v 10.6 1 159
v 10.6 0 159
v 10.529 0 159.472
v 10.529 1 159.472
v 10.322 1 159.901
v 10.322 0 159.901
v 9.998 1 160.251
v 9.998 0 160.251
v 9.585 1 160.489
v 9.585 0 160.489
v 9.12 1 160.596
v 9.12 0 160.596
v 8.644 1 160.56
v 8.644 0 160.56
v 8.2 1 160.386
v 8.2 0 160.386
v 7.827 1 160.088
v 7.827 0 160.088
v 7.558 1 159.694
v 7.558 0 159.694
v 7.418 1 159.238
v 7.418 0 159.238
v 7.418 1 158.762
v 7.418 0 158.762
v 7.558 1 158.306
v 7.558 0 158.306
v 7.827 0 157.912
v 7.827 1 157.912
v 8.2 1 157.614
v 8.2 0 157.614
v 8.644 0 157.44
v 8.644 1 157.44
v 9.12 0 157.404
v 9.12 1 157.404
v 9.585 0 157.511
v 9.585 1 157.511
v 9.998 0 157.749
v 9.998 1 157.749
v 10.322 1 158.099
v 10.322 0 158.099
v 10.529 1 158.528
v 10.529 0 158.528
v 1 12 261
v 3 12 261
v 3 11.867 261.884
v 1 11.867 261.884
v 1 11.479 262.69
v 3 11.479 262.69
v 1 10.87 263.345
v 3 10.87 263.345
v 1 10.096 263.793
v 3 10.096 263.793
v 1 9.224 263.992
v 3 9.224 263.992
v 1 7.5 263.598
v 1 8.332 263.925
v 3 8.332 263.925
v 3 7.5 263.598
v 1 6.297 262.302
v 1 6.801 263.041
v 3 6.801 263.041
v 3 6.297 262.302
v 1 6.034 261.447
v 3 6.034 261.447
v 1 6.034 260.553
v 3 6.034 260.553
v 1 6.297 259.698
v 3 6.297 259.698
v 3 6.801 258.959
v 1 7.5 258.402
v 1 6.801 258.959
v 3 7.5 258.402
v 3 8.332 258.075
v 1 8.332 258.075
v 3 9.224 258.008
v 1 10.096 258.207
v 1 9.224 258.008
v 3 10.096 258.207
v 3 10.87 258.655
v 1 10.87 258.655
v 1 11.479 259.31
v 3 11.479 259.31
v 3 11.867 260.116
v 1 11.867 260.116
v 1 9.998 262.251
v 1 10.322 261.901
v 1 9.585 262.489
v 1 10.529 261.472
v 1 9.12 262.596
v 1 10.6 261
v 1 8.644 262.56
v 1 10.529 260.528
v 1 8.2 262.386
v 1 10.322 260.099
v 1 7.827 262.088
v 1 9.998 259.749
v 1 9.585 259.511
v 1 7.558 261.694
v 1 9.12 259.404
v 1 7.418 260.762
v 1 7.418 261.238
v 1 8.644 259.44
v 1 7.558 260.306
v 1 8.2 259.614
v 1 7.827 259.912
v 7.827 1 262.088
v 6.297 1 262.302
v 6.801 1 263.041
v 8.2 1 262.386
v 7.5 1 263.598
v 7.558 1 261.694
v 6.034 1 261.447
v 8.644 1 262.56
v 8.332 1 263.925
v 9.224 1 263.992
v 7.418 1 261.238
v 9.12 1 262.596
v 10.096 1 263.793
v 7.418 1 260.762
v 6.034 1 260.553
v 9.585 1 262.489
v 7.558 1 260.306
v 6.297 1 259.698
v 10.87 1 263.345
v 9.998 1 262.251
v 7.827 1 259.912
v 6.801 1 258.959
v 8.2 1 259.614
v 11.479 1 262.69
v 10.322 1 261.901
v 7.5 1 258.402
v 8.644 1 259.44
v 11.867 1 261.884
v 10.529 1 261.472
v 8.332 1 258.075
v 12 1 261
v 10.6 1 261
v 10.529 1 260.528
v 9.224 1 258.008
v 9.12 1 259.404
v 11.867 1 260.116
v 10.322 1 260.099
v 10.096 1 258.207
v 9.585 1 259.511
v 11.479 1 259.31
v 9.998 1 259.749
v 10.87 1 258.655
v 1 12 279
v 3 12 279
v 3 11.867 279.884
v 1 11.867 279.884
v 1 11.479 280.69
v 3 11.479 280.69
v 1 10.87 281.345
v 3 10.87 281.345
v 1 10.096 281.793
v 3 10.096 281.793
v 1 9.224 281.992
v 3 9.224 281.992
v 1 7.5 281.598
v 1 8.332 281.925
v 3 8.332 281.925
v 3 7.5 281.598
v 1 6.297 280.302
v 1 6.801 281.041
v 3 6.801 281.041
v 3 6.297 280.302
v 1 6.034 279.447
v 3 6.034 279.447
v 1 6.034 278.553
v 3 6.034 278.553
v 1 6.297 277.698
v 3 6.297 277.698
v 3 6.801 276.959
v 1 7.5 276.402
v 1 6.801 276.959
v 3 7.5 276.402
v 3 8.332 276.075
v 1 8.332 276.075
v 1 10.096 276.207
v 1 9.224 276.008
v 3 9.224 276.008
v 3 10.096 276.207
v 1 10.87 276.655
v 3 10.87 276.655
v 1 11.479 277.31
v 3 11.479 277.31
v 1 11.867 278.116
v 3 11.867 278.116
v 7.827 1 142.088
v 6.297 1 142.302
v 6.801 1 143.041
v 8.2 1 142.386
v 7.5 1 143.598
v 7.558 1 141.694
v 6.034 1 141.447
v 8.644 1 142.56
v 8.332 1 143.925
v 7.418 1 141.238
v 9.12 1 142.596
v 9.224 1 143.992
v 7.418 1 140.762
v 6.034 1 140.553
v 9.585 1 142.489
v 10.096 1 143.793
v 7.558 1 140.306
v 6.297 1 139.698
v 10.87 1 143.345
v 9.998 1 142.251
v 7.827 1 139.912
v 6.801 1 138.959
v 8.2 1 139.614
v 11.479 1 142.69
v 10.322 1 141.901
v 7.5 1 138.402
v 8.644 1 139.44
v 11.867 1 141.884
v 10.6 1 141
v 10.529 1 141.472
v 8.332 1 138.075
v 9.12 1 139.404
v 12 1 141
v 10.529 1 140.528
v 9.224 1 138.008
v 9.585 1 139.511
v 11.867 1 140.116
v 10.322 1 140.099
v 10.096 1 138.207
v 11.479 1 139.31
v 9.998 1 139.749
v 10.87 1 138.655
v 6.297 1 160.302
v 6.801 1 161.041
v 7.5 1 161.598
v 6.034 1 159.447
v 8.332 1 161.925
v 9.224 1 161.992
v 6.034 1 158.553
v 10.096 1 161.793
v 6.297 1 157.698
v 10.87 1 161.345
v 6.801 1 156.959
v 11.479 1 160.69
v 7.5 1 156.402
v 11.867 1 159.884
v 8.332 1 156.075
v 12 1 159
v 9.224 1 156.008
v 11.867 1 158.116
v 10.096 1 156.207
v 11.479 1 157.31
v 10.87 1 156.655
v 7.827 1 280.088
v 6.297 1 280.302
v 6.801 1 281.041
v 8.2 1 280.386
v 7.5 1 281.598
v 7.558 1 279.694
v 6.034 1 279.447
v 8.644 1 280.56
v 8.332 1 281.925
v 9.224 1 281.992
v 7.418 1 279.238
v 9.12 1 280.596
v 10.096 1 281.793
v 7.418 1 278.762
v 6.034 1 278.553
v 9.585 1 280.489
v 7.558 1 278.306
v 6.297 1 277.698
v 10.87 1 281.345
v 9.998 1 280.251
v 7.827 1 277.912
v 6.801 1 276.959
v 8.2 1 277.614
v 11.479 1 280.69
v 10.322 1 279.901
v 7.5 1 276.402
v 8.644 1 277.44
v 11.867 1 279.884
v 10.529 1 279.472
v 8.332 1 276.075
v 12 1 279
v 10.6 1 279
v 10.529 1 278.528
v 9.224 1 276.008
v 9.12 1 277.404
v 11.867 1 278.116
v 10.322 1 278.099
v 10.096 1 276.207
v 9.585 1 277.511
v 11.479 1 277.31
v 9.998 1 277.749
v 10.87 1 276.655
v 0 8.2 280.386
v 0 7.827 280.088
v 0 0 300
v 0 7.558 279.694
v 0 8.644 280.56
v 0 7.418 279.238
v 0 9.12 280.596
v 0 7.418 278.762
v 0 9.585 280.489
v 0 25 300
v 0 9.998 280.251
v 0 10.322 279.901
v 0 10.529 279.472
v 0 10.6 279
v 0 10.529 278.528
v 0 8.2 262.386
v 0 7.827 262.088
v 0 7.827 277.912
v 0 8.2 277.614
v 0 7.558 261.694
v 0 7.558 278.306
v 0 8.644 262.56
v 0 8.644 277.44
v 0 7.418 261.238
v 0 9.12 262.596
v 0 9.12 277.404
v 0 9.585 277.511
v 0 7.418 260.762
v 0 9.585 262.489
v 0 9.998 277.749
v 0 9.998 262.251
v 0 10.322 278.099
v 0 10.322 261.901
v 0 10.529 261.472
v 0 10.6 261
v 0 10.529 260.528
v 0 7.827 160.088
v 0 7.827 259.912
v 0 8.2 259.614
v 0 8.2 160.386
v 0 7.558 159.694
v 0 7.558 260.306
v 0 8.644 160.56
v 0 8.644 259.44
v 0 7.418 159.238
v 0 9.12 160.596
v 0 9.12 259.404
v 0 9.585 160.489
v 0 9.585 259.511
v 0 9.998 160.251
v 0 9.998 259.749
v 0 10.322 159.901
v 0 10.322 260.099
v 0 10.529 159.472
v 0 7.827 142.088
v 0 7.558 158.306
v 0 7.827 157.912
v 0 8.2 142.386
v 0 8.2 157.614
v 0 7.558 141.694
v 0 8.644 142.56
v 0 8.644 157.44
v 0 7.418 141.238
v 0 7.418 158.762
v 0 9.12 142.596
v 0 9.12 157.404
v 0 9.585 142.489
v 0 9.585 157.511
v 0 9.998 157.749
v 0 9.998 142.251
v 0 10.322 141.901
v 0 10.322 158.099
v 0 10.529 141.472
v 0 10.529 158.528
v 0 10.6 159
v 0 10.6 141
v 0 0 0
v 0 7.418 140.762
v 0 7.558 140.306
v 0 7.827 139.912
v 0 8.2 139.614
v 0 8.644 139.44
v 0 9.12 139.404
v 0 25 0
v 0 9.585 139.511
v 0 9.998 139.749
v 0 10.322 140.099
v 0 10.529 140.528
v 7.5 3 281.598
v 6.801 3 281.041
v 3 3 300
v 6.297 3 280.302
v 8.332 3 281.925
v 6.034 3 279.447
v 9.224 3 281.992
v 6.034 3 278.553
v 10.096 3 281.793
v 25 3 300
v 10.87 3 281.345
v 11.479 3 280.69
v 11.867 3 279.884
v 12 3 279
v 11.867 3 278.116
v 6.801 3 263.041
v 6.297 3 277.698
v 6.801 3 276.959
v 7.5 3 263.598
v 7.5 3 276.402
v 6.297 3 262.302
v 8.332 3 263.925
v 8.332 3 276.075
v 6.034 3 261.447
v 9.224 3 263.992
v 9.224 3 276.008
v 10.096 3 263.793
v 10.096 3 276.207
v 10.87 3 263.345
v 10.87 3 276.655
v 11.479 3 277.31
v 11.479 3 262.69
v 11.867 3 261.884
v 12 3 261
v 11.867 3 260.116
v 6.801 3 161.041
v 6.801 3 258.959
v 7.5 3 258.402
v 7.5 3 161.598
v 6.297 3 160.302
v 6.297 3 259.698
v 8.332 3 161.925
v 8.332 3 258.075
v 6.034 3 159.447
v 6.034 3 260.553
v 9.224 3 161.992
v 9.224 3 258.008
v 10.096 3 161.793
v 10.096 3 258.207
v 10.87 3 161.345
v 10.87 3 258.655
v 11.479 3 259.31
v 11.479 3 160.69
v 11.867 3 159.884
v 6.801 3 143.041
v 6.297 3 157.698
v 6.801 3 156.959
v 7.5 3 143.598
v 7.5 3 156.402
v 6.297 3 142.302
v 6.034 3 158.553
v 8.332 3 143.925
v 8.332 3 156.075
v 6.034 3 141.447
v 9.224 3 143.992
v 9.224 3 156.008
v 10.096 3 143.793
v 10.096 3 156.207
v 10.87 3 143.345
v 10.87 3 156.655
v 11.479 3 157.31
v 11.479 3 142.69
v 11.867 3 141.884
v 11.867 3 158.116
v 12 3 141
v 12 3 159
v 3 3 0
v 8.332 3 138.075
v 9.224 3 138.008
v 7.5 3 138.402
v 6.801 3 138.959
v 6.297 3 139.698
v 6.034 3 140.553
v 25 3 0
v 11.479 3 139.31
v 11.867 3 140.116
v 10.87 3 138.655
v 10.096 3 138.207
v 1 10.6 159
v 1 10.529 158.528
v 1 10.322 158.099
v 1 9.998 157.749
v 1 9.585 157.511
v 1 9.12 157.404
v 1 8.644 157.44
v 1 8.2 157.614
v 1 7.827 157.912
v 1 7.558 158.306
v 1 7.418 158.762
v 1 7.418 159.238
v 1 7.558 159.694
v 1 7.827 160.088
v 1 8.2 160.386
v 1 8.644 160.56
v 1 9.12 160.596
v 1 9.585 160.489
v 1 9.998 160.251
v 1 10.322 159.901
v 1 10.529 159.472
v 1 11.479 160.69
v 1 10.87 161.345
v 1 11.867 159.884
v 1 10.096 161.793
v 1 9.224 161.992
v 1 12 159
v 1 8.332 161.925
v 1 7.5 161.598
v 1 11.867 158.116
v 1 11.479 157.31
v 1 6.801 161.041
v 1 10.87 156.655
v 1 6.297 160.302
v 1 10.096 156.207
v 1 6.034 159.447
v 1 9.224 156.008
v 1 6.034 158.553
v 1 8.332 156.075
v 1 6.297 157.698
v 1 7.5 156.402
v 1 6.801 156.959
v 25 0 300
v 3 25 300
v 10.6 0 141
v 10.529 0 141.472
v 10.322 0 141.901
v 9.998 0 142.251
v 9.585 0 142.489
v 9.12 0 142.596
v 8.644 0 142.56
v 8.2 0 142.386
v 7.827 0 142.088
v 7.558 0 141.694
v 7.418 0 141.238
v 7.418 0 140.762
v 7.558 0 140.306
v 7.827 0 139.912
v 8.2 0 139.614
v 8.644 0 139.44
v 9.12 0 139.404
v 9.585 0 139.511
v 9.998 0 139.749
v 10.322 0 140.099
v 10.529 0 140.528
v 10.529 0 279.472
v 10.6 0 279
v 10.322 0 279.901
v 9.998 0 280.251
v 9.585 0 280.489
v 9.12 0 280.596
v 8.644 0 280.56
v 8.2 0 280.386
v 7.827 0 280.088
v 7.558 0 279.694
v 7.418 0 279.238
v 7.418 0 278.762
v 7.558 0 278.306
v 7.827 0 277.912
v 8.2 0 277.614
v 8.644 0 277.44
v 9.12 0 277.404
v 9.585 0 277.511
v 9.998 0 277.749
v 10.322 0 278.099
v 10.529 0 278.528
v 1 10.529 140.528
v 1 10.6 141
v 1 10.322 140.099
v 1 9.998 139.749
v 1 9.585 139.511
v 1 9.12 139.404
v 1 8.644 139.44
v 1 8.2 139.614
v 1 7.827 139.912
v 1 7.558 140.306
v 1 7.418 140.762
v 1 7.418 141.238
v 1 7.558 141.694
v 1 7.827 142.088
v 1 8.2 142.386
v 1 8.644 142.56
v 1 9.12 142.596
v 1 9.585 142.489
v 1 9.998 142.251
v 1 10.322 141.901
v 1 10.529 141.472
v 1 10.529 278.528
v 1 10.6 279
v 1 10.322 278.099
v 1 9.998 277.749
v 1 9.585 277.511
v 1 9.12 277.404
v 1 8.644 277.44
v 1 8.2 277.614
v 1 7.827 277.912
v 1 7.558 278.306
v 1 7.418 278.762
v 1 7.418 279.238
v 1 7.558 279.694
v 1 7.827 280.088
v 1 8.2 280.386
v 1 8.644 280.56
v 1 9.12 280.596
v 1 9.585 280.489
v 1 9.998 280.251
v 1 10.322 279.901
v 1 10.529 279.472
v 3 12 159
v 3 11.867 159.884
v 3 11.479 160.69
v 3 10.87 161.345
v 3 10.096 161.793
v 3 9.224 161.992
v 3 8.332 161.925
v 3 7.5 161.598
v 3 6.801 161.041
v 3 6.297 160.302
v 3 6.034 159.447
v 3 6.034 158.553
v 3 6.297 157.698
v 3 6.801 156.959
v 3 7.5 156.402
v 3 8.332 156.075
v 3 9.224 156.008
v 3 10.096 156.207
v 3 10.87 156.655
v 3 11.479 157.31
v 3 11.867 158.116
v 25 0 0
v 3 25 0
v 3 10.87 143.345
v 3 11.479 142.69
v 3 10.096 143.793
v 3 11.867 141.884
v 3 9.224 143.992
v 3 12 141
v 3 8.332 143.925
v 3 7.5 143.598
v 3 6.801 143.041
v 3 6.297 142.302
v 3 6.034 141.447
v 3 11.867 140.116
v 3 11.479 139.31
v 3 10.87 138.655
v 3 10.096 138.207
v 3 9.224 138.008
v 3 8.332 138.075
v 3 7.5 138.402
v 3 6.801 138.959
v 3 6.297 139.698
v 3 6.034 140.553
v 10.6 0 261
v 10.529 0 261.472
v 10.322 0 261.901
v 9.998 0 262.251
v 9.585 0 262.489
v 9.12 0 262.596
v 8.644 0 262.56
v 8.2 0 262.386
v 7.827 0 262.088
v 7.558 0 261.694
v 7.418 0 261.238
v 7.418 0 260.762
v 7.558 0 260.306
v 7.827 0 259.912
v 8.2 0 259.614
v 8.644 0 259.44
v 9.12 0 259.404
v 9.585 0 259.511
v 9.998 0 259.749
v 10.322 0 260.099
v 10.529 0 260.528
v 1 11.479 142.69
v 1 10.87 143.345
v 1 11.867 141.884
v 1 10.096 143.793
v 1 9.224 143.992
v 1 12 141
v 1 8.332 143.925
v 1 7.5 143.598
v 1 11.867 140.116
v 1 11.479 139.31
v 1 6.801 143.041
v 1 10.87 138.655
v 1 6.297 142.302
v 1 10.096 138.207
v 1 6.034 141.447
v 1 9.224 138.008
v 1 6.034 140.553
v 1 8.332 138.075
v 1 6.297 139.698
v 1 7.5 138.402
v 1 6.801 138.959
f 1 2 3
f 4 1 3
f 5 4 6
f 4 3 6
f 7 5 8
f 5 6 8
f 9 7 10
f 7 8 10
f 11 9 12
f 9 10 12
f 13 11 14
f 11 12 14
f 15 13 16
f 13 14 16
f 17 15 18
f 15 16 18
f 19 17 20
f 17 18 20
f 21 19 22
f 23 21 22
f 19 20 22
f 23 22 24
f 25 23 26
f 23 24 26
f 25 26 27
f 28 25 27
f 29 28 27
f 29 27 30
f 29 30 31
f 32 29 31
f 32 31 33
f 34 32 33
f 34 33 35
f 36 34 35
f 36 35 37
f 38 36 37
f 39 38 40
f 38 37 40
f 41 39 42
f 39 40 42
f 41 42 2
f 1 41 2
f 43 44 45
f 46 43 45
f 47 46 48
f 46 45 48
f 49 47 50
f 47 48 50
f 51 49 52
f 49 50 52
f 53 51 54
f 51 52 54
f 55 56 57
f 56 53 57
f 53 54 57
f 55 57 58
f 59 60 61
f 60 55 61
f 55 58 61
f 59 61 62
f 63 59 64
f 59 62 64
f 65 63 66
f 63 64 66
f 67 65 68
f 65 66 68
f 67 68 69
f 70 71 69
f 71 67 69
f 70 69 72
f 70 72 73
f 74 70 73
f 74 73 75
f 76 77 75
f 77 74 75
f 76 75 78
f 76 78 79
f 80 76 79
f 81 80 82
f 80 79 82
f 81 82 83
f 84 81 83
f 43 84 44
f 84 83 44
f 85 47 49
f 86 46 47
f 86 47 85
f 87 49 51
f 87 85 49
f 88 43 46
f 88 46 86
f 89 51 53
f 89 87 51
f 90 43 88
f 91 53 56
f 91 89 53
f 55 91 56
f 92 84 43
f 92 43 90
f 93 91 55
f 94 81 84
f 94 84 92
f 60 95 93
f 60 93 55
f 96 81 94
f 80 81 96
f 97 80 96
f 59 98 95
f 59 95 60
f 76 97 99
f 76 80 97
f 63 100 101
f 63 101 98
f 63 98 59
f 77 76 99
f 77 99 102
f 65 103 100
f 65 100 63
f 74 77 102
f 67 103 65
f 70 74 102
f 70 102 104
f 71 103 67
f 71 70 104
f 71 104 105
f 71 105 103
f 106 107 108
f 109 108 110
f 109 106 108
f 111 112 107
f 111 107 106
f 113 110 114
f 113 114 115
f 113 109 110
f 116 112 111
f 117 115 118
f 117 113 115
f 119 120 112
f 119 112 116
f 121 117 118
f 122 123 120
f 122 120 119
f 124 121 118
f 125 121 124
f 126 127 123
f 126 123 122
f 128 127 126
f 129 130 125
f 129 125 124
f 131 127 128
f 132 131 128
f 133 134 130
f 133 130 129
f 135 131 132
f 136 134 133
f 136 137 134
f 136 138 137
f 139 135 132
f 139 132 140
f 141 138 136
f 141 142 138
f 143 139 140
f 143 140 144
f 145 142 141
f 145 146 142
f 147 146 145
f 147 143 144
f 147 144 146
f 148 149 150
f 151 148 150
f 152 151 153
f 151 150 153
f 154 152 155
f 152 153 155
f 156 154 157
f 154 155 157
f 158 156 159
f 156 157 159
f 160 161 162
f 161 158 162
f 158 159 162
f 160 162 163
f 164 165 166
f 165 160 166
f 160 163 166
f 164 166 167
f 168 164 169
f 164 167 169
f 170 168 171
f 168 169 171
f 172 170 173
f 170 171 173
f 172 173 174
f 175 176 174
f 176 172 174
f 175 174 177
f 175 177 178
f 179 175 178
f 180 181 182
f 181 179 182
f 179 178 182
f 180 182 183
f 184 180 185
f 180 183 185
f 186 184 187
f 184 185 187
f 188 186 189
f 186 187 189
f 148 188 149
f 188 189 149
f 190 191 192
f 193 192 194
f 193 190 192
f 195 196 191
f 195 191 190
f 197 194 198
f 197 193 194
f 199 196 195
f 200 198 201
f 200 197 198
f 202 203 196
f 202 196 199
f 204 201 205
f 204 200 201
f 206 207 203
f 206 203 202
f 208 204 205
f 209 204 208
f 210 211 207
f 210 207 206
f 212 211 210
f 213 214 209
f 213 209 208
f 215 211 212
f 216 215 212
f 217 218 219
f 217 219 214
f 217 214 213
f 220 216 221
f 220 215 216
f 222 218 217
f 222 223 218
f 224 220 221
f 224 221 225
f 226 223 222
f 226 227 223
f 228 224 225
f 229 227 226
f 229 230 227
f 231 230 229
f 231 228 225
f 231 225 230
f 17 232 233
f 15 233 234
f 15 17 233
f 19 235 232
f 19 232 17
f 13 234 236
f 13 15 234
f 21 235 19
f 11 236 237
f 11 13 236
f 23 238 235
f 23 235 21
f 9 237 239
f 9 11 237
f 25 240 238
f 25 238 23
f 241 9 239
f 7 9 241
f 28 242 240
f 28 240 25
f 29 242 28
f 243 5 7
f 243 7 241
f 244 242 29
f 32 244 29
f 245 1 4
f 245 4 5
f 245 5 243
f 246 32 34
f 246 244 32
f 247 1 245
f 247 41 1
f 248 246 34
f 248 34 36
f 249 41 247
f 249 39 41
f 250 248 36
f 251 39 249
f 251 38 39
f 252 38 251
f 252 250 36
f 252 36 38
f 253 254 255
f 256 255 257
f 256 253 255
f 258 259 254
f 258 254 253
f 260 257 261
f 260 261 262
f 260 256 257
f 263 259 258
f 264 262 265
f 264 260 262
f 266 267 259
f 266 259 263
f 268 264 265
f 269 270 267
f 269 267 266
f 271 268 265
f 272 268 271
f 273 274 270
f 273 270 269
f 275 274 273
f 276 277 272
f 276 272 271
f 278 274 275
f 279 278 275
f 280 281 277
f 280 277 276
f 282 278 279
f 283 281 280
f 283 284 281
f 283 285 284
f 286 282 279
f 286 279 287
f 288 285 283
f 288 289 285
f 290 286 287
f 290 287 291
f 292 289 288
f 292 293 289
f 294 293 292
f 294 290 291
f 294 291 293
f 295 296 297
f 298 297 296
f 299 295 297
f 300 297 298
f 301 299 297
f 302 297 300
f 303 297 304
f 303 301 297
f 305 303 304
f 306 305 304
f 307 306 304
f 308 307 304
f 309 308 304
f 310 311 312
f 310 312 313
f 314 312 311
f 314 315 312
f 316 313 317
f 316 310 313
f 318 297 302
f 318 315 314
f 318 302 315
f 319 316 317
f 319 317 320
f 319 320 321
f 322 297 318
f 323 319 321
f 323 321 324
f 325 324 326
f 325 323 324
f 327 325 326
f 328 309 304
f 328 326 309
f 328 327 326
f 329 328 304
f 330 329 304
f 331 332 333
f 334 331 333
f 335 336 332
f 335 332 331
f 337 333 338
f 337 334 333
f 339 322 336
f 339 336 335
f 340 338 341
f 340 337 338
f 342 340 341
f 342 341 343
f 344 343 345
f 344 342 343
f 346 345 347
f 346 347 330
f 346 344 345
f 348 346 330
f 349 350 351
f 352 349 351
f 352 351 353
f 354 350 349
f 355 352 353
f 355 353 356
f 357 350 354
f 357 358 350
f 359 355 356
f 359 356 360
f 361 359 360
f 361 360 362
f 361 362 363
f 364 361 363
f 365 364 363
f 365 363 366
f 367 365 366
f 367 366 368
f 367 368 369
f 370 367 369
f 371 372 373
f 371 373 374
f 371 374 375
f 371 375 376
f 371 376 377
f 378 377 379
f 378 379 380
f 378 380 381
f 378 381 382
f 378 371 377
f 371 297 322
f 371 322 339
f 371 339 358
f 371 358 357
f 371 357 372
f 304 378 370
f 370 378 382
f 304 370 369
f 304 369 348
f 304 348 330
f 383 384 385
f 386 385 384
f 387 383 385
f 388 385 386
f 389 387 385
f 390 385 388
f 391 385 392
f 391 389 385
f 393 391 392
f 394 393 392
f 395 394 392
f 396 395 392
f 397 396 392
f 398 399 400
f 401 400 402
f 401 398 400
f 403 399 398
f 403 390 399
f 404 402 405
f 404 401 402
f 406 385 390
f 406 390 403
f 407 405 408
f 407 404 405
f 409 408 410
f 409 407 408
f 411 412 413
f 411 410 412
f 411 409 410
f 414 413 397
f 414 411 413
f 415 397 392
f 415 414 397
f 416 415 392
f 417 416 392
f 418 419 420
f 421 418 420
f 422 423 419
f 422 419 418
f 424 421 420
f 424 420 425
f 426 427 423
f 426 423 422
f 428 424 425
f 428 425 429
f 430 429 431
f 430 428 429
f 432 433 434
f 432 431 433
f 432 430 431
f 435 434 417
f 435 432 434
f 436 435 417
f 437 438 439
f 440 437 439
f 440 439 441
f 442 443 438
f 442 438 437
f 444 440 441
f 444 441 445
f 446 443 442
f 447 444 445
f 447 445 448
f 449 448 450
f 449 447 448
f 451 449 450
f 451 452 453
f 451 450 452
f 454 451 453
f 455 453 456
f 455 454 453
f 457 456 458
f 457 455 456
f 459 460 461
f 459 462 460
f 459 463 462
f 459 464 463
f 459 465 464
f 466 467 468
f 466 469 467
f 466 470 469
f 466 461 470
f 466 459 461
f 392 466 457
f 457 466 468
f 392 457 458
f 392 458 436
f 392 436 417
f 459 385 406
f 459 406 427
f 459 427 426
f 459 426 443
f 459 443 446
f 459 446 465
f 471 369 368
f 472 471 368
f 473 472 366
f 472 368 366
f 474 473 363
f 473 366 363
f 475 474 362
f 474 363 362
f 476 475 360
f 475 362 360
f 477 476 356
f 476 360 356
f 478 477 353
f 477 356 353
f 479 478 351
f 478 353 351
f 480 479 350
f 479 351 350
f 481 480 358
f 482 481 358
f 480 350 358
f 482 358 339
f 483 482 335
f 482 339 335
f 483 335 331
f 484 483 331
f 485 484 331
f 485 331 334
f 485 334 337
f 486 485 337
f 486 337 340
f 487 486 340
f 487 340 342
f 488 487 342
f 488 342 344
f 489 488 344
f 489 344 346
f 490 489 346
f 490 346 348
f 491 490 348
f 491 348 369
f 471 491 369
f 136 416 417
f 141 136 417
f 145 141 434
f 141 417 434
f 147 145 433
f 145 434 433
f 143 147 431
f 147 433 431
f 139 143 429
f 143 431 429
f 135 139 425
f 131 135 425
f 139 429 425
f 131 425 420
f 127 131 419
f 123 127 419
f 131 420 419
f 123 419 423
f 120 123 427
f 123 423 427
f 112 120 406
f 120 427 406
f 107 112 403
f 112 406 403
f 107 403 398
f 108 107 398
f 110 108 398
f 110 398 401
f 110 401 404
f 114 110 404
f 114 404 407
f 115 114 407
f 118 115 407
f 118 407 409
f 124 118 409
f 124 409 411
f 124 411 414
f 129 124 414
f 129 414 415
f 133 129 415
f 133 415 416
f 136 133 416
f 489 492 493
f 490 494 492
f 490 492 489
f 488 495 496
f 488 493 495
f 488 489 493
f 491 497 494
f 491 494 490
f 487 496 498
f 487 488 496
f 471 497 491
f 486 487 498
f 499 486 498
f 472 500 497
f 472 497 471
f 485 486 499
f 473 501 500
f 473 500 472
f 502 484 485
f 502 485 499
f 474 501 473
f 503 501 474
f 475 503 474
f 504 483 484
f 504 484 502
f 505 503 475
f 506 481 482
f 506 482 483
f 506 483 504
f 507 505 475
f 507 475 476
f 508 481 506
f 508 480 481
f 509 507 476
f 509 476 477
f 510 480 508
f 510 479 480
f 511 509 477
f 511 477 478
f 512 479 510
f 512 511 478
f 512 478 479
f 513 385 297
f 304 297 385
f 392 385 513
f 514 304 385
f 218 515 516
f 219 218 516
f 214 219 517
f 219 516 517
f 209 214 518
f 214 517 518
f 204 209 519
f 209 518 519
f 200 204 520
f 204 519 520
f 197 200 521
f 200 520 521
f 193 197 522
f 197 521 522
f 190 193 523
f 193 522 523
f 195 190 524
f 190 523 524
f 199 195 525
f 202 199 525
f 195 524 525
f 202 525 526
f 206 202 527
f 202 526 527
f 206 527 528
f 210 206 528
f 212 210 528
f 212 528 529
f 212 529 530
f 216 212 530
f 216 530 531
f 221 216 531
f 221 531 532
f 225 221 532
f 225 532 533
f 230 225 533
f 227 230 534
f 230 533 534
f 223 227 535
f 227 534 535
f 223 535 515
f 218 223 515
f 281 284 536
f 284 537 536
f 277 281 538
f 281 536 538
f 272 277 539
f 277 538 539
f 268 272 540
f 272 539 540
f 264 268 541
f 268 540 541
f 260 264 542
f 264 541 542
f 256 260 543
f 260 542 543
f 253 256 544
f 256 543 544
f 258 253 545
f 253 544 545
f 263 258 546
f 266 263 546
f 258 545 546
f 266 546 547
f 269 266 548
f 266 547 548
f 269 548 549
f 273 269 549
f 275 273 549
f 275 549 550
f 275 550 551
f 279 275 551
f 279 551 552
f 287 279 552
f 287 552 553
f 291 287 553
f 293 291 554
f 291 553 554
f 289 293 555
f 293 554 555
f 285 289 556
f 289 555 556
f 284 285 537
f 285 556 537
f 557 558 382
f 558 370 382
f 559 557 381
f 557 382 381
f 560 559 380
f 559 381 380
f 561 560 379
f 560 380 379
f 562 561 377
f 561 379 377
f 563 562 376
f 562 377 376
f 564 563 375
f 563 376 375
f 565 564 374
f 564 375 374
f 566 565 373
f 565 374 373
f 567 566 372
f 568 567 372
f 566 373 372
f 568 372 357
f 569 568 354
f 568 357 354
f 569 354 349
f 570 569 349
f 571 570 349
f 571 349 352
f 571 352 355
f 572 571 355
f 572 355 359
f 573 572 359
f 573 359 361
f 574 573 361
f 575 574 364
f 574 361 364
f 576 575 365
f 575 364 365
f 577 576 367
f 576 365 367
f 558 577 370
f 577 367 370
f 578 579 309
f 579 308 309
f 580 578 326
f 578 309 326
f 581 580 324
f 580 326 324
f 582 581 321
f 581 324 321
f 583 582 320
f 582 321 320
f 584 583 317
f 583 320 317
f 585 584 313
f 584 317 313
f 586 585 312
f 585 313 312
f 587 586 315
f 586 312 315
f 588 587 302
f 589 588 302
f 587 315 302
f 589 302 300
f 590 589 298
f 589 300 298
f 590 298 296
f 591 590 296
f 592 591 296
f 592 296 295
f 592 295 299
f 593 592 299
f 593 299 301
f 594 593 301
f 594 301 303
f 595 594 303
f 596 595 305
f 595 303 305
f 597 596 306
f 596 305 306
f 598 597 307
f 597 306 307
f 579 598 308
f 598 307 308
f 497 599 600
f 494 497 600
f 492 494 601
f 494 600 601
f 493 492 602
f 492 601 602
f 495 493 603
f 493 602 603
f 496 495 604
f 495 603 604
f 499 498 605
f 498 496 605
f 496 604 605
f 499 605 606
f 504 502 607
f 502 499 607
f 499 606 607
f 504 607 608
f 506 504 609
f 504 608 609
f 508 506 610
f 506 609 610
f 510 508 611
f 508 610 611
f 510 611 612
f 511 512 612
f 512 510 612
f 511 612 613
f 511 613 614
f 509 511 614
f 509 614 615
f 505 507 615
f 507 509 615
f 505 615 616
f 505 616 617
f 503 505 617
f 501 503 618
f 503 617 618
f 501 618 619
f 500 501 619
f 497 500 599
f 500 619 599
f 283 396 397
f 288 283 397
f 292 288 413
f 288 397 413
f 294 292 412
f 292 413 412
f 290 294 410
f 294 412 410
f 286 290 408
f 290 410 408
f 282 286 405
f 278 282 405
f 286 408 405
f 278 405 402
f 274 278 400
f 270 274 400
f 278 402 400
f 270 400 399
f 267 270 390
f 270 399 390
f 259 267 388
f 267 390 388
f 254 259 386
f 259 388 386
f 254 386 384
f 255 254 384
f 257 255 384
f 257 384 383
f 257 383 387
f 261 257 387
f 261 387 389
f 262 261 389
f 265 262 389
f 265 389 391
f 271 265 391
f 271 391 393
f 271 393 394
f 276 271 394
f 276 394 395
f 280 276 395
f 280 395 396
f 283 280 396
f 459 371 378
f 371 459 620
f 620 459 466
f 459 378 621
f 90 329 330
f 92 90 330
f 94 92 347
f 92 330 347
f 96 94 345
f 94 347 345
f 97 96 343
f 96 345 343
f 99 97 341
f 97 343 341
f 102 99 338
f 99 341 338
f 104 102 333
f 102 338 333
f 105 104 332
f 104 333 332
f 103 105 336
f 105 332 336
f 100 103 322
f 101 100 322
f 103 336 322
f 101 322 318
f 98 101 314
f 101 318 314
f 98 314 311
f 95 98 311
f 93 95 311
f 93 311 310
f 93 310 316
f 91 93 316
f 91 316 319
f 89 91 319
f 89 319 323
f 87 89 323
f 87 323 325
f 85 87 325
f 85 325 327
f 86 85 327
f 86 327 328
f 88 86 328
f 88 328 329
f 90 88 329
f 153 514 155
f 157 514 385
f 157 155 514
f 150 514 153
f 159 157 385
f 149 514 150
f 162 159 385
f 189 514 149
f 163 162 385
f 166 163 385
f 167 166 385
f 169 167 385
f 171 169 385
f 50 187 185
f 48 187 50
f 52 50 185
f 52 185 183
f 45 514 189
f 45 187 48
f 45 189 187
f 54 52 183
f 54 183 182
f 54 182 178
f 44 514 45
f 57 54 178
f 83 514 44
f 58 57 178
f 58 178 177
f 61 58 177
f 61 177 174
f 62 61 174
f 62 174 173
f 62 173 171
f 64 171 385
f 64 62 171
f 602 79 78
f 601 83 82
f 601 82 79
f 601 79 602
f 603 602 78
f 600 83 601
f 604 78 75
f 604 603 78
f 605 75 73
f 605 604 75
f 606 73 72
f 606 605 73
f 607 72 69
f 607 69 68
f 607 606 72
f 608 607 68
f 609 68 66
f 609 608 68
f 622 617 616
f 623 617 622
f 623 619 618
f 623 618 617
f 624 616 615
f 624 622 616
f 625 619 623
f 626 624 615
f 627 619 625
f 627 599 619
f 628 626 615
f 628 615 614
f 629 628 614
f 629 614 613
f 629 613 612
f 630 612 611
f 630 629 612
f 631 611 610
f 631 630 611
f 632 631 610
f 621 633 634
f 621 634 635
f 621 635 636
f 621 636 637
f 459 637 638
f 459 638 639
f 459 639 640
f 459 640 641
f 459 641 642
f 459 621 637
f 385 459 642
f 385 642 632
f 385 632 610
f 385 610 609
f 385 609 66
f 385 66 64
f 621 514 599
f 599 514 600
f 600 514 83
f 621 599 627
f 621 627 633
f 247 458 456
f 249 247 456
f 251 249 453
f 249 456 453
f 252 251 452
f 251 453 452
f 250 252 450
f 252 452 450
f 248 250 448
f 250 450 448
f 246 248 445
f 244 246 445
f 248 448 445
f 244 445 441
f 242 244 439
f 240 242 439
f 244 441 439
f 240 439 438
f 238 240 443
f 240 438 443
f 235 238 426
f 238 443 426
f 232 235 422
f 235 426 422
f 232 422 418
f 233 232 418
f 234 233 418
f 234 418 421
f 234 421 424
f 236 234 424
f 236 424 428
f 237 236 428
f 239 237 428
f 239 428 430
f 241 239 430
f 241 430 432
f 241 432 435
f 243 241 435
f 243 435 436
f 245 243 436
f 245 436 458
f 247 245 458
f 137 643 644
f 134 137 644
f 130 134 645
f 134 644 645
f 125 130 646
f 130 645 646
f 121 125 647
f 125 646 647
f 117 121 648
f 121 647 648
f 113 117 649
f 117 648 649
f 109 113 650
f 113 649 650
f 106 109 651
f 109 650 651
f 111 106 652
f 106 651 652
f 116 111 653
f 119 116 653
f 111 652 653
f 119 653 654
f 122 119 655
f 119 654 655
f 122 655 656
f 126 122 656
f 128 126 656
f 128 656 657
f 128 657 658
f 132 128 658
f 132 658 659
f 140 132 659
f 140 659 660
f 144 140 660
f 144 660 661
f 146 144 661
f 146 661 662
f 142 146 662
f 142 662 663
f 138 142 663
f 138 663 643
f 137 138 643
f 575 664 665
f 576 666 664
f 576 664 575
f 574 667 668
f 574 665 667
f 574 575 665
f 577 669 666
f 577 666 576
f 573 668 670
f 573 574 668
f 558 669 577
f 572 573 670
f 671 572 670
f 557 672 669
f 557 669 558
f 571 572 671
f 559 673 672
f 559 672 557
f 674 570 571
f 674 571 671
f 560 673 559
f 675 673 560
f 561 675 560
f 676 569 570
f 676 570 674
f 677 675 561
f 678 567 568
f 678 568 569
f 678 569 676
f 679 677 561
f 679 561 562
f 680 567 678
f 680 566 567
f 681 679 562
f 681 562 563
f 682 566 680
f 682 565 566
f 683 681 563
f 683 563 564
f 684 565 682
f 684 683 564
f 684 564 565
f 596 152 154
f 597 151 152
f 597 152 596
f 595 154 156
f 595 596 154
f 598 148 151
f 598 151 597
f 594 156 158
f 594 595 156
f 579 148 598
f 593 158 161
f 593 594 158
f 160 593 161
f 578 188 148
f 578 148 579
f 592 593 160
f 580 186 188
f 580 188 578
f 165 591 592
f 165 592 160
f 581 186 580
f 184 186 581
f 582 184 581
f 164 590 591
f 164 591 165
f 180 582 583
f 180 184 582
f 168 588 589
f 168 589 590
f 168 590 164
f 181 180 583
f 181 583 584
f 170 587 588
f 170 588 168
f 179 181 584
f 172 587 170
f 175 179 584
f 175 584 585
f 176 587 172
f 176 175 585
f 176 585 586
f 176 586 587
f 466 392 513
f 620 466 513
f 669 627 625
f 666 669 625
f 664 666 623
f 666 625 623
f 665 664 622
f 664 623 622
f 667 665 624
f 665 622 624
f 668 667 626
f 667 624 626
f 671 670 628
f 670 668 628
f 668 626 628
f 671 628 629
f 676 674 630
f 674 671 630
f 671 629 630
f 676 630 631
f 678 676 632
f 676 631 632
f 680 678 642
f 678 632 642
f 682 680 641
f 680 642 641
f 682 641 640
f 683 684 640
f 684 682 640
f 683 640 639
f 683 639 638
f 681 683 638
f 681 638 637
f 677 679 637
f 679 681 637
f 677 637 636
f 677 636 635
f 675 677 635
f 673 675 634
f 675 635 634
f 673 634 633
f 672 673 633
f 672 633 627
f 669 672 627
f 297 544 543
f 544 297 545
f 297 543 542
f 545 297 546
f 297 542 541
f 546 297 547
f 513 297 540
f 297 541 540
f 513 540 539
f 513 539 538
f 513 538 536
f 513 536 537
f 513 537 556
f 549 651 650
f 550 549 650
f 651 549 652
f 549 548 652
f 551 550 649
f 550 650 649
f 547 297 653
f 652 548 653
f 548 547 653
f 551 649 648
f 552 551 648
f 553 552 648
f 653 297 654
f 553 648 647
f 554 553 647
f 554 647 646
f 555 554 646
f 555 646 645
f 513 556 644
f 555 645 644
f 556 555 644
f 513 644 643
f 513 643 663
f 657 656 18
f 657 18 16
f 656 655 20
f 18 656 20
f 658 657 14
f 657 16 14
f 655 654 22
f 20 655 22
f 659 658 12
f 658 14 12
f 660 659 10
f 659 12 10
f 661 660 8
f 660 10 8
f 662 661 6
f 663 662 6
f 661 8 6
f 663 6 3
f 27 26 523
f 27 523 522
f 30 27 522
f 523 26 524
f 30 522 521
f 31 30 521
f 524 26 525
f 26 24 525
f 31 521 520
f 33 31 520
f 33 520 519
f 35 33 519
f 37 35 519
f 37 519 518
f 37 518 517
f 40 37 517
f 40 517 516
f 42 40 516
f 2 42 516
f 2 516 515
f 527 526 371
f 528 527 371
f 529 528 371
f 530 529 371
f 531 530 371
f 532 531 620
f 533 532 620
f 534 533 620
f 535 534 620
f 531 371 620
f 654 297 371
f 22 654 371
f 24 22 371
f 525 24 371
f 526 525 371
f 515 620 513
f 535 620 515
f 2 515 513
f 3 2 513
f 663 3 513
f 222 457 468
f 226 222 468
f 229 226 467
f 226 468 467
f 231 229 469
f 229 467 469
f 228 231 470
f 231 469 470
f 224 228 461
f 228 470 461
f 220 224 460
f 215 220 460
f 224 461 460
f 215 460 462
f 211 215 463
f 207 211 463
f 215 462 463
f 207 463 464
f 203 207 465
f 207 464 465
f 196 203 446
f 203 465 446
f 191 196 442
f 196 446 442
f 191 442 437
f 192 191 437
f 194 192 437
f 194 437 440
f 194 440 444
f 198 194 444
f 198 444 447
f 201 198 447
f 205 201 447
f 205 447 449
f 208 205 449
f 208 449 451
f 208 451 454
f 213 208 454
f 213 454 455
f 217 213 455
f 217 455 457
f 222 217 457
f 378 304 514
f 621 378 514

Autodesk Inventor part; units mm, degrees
ref_plane "YZ Plane" through (0, 0, 0) normal (1, 0, 0) x (0, 1, 0)
ref_plane "XZ Plane" through (0, 0, 0) normal (0, 1, 0) x (-1, 0, 0)
sketch "Boceto1" plane through (0, 0, 0) normal (0, 0, 1) x (1, 0, 0)
  line L0 (0, 0) -> (0, 25)
  line L1 (0, 0) -> (25, 0)
  line L2 (3, 25) -> (3, 3)
  line L3 (3, 3) -> (25, 3)
  line L4 (0, 25) -> (3, 25)
  line L5 (25, 3) -> (25, 0)
  dimension "d0" = 25
  dimension "d1" = 25
  dimension "d2" = 3
extrude "Extrusión1" add sketch "Boceto1" along normal blind 300
sketch "Boceto2" plane through (0, 0, 0) normal (0, -1, 0) x (1, 0, 0)
  line L0 (0, 0) -> (25, 0) construction
  line L1 (25, 0) -> (25, 300) construction
  line L2 (0, 300) -> (25, 300) construction
  line L3 (0, 0) -> (0, 300) construction
  line L4 (25, 0) -> (25, 300) construction
  line L5 (25, 150) -> (0, 150) construction
  line L6 (25, 300) -> (3, 300) projected
  line L7 (9, 300) -> (9, 0) construction
  circle A0 centre (9, 159) radius 1.6
  circle A1 centre (9, 141) radius 1.6
  circle A2 centre (9, 279) radius 1.6
  circle A3 centre (9, 261) radius 1.6
  line L8 (25, 270) -> (0, 270) construction
  line L9 (0, 0) -> (0, 300) construction
  dimension "d5" = 3.2
  dimension "d6" = 3.2
  dimension "d7" = 18
  dimension "d8" = 9
  dimension "d9" = 3.2
  dimension "d10" = 3.2
  dimension "d11" = 18
  dimension "d12" = 9
  dimension "d13" = 30
  dimension "d14" = 9
extrude "Extrusión2" cut sketch "Boceto2" against normal through all
ref_plane "Plano de trabajo1" through (0, 0, 0) normal (0.7071, -0.7071, 0) x (0, 0, 1)
mirror "Simetría1" about plane through (0, 0, 0) normal (0.7071, -0.7071, 0) of "Extrusión2"
sketch "Boceto3" plane through (3, 3, 0) normal (0, 1, 0) x (1, 0, 0)
  circle A0 centre (6, -279) radius 1.6 construction
  circle A1 centre (6, -141) radius 1.6 construction
  circle A2 centre (6, -159) radius 1.6 construction
  circle A3 centre (6, -261) radius 1.6 construction
  line L0 (22, 0) -> (0, 0) construction
  line L1 (0, 0) -> (0, -300) construction
  line L2 (22, -300) -> (0, -300) construction
  line L3 (22, 0) -> (22, -300) construction
  circle A4 centre (6, -141) radius 1.6 projected
  circle A5 centre (6, -141) radius 3
  circle A6 centre (6, -159) radius 1.6 projected
  circle A7 centre (6, -159) radius 3
  circle A8 centre (6, -261) radius 1.6 projected
  circle A9 centre (6, -261) radius 3
  circle A10 centre (6, -279) radius 1.6 projected
  circle A11 centre (6, -279) radius 3
  point P0 (-3, 0)
  dimension "d17" = 6
  dimension "d18" = 6
  dimension "d19" = 6
  dimension "d20" = 6
extrude "Extrusión3" cut sketch "Boceto3" against normal blind 2 contours A4 | A5 | A6 | A7 | A8 | A9 | A10 | A11
mirror "Simetría2" about plane through (0, 0, 0) normal (0.7071, -0.7071, 0) of "Extrusión3"
equation "\"d8\" = 0.5 * d7"
equation "\"d12\" = 0.5 * d11"
properties part number "caleta_completa"
